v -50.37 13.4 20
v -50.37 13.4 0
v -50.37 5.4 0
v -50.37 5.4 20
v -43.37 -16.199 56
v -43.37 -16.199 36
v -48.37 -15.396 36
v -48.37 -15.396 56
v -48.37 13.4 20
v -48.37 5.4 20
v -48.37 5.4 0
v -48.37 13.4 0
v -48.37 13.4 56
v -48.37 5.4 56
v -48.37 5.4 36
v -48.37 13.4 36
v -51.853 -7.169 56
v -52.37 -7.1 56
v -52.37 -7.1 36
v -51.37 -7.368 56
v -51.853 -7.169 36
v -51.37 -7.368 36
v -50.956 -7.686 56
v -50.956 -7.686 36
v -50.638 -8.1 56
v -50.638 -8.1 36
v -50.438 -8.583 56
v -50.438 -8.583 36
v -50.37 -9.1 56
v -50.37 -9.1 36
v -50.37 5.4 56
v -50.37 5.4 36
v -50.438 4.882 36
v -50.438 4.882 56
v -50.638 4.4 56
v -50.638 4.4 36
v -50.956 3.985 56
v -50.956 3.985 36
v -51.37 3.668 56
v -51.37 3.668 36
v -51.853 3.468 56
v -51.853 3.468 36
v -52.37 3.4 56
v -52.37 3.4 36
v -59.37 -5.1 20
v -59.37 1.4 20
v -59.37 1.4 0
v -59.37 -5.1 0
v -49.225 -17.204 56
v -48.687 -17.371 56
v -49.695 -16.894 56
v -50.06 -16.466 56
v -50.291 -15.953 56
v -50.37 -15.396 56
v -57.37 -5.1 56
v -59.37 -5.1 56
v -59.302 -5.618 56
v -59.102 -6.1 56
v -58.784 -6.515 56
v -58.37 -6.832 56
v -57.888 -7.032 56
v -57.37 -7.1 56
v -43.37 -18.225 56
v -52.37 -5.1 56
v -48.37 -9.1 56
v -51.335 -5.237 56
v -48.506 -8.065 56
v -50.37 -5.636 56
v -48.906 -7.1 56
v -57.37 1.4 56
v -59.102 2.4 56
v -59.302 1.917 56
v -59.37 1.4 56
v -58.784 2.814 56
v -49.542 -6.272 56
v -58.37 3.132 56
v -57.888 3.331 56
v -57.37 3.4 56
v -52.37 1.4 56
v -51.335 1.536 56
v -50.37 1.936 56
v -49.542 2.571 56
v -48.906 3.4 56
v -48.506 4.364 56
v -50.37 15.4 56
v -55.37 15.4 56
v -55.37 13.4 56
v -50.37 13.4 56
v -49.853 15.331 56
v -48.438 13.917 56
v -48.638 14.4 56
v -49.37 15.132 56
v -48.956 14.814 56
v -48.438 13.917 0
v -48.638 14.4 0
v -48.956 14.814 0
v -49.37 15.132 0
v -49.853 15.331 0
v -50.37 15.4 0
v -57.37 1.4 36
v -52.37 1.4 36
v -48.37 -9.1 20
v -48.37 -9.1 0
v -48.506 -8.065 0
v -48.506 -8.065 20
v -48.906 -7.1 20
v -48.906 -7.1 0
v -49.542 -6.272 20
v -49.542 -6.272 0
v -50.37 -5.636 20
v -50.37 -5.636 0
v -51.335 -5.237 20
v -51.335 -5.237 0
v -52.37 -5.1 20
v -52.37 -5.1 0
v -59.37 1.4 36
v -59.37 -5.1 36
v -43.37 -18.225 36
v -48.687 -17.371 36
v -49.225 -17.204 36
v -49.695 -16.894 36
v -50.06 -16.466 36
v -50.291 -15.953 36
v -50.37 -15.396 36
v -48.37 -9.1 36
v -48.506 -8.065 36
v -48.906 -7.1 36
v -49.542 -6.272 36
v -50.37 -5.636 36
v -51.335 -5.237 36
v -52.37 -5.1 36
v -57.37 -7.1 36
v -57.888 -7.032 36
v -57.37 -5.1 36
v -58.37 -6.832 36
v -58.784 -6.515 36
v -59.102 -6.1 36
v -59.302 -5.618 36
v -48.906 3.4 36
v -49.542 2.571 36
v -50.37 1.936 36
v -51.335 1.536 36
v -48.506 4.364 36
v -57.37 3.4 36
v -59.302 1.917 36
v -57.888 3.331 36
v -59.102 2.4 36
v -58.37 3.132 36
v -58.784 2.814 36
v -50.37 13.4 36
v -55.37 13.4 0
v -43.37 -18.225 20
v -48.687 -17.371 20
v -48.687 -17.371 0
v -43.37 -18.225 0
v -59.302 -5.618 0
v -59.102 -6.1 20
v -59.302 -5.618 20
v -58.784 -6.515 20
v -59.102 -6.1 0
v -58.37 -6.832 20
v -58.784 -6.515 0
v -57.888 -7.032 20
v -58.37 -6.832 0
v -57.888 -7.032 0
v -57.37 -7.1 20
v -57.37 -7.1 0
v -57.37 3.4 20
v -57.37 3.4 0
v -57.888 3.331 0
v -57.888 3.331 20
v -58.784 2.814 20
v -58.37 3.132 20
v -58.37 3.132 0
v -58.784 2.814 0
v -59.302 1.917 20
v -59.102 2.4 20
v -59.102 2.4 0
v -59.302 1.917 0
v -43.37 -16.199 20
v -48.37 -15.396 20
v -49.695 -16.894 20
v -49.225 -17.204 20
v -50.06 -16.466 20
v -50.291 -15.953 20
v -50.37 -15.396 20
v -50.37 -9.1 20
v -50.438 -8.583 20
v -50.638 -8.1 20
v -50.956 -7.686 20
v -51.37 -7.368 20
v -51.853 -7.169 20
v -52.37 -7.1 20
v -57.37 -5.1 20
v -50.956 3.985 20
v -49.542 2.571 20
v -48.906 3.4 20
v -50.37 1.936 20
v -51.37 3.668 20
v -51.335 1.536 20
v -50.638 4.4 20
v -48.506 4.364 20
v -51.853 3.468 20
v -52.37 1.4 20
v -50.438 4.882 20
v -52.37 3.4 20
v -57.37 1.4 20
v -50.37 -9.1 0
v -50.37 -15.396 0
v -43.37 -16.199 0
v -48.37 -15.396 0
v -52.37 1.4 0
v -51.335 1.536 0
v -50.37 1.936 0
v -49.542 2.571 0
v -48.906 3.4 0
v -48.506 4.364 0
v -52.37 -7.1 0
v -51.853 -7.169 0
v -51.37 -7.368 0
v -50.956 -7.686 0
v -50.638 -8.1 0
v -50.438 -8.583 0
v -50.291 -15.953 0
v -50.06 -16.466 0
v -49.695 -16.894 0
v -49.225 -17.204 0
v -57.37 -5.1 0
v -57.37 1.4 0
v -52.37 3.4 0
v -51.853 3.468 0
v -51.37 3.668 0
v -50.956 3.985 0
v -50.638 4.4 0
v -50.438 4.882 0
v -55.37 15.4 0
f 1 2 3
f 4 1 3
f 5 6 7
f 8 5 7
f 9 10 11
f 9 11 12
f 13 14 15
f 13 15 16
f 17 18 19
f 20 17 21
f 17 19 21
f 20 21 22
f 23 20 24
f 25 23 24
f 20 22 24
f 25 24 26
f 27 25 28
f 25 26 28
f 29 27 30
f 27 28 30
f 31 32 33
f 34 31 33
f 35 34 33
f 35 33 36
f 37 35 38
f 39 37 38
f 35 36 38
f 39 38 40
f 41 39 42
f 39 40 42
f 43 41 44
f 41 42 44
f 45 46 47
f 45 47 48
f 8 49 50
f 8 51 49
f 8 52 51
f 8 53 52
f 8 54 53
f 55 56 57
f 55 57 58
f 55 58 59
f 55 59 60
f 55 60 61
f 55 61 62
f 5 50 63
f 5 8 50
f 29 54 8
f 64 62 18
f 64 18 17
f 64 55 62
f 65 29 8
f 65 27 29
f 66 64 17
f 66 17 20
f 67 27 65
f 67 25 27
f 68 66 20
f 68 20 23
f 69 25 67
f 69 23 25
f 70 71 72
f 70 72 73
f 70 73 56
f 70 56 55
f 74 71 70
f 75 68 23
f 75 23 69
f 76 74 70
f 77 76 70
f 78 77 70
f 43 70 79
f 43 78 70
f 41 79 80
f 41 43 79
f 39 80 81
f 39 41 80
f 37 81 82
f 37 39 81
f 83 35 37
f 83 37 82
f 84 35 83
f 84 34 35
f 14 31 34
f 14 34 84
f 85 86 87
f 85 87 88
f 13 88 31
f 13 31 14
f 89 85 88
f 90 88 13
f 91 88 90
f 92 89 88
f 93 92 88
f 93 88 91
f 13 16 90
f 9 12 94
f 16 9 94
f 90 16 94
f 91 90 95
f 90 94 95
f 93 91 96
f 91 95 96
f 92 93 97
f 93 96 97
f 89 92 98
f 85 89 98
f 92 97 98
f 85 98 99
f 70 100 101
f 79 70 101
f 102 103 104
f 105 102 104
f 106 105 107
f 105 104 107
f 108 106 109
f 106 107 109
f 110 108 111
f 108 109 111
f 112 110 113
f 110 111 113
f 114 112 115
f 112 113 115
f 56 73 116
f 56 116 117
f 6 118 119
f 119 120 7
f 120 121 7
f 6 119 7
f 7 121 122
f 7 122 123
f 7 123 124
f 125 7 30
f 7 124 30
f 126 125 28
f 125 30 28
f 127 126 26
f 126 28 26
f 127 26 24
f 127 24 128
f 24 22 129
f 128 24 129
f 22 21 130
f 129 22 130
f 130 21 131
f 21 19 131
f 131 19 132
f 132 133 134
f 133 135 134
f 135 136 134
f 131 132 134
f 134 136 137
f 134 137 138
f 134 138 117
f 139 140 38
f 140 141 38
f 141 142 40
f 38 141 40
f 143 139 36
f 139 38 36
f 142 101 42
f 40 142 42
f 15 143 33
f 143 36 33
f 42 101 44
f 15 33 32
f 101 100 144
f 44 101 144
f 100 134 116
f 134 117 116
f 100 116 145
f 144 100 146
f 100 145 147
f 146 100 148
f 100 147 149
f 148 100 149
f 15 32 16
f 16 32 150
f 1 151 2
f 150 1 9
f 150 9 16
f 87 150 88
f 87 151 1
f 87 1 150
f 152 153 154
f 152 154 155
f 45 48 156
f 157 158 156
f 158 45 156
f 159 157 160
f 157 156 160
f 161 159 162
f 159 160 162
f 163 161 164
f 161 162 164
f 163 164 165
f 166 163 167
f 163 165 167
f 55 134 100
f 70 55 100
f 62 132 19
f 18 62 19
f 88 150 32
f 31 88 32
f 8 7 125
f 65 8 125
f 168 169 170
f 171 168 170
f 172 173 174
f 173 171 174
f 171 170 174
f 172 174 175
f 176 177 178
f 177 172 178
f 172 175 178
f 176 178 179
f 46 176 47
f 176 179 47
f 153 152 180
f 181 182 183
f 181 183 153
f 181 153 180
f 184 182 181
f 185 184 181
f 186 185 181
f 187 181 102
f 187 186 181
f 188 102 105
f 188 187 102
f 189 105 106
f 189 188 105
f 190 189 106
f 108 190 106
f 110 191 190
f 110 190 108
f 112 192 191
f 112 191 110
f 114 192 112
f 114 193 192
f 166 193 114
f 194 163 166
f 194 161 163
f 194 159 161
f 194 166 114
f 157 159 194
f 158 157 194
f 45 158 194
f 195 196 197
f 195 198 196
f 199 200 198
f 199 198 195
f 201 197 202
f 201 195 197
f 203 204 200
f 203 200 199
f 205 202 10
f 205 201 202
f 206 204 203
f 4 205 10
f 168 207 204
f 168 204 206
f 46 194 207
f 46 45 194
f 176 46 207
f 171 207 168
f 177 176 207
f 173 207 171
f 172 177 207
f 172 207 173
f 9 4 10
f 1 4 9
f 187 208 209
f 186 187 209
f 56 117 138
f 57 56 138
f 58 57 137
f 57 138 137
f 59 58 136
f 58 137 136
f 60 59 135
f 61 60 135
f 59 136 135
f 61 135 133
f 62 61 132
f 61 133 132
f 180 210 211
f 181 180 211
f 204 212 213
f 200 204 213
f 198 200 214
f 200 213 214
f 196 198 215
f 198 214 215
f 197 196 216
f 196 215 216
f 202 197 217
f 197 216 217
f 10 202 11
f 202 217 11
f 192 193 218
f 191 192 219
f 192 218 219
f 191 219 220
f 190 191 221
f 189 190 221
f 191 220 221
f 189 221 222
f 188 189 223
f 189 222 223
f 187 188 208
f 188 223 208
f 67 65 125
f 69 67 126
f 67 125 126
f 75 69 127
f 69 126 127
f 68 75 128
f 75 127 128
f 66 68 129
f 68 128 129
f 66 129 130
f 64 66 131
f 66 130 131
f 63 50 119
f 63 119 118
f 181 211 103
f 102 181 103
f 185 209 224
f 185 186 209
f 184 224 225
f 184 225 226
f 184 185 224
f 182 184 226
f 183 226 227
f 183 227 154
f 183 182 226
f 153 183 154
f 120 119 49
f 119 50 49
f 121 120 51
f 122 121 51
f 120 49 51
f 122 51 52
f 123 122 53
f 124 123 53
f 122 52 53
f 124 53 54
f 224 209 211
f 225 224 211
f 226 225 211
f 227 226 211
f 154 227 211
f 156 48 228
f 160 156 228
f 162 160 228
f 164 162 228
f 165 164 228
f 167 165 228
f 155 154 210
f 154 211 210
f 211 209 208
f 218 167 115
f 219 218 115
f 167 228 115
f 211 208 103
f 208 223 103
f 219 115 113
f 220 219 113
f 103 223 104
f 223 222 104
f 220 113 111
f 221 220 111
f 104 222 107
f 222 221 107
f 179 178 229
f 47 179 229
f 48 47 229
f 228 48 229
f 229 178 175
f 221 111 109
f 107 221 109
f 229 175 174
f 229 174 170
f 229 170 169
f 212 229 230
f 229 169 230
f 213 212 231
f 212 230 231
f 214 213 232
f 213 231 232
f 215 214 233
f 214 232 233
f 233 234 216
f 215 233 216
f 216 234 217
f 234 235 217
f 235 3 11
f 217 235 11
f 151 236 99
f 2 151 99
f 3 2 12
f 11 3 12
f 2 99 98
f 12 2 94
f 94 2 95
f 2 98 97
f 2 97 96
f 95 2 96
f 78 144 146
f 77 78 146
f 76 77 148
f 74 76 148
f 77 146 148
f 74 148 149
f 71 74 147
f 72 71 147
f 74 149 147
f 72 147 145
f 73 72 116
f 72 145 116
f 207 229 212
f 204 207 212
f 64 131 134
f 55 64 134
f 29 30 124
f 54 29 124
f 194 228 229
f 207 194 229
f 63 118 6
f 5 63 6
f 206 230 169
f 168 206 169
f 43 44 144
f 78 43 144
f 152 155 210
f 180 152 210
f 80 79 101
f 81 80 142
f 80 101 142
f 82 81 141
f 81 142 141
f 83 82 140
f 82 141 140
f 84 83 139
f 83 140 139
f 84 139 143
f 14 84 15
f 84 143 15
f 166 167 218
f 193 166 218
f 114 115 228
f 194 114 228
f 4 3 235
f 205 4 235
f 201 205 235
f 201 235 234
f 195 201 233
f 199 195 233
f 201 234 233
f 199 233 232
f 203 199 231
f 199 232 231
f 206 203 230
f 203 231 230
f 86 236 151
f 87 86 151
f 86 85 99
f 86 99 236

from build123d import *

# Parameters (mm, degrees)
BOSS_EXTRUDE1_DEPTH = 56
SKETCH3_W           = 16
SKETCH3_H           = 36.624213763
CUT_EXTRUDE1_DEPTH  = 62.025698964
FILLET1_R           = 2


with BuildPart() as part:
    # Sketch2 → Boss-Extrude1 (new body)
    with BuildSketch(Plane.XY):
        with BuildLine():
            Line((-50.370168415, 15.39961681), (-55.370168415, 15.39961681))
            Line((-55.370168415, 15.39961681), (-55.370168415, 13.39961681))
            Line((-55.370168415, 13.39961681), (-50.370168415, 13.39961681))
            Line((-50.370168415, 13.39961681), (-50.370168415, 5.39961681))
            ThreePointArc((-50.370168415, 5.39961681), (-50.955954852, 3.985403248), (-52.370168415, 3.39961681))
            Line((-52.370168415, 3.39961681), (-57.370168415, 3.39961681))
            ThreePointArc((-57.370168415, 3.39961681), (-58.784381977, 2.813830372), (-59.370168415, 1.39961681))
            Line((-59.370168415, 1.39961681), (-59.370168415, -5.10038319))
            ThreePointArc((-59.370168415, -5.10038319), (-58.784381977, -6.514596752), (-57.370168415, -7.10038319))
            Line((-57.370168415, -7.10038319), (-52.370168415, -7.10038319))
            ThreePointArc((-52.370168415, -7.10038319), (-50.955954852, -7.686169628), (-50.370168415, -9.10038319))
            Line((-50.370168415, -9.10038319), (-50.370168415, -17.10038319))
            Line((-50.370168415, -17.10038319), (-43.370168415, -18.224596953))
            Line((-43.370168415, -18.224596953), (-43.370168415, -16.19896817))
            Line((-43.370168415, -16.19896817), (-48.370168415, -15.395958339))
            Line((-48.370168415, -15.395958339), (-48.370168415, -9.10038319))
            ThreePointArc((-48.370168415, -9.10038319), (-49.54174129, -6.271956065), (-52.370168415, -5.10038319))
            Line((-52.370168415, -5.10038319), (-57.370168415, -5.10038319))
            Line((-57.370168415, -5.10038319), (-57.370168415, 1.39961681))
            Line((-57.370168415, 1.39961681), (-52.370168415, 1.39961681))
            ThreePointArc((-52.370168415, 1.39961681), (-49.54174129, 2.571189685), (-48.370168415, 5.39961681))
            Line((-48.370168415, 5.39961681), (-48.370168415, 13.39961681))
            ThreePointArc((-48.370168415, 13.39961681), (-48.955954852, 14.813830372), (-50.370168415, 15.39961681))
        make_face()
    extrude(amount=BOSS_EXTRUDE1_DEPTH)

    # Sketch3 → Cut-Extrude1 (cut, through all)
    with BuildSketch(Plane.ZY.offset(59.370168415)):
        with Locations((28, -4.912490072)):
            Rectangle(SKETCH3_W, SKETCH3_H)
    extrude(amount=-CUT_EXTRUDE1_DEPTH, mode=Mode.SUBTRACT)

    # Fillet1
    fillet1_edges = [part.edges().sort_by_distance(p)[0] for p in [
        (-50.370168415, -17.10038319, 46),
        (-50.370168415, -17.10038319, 10),
    ]]
    fillet(fillet1_edges, radius=FILLET1_R)


solid = part.part
